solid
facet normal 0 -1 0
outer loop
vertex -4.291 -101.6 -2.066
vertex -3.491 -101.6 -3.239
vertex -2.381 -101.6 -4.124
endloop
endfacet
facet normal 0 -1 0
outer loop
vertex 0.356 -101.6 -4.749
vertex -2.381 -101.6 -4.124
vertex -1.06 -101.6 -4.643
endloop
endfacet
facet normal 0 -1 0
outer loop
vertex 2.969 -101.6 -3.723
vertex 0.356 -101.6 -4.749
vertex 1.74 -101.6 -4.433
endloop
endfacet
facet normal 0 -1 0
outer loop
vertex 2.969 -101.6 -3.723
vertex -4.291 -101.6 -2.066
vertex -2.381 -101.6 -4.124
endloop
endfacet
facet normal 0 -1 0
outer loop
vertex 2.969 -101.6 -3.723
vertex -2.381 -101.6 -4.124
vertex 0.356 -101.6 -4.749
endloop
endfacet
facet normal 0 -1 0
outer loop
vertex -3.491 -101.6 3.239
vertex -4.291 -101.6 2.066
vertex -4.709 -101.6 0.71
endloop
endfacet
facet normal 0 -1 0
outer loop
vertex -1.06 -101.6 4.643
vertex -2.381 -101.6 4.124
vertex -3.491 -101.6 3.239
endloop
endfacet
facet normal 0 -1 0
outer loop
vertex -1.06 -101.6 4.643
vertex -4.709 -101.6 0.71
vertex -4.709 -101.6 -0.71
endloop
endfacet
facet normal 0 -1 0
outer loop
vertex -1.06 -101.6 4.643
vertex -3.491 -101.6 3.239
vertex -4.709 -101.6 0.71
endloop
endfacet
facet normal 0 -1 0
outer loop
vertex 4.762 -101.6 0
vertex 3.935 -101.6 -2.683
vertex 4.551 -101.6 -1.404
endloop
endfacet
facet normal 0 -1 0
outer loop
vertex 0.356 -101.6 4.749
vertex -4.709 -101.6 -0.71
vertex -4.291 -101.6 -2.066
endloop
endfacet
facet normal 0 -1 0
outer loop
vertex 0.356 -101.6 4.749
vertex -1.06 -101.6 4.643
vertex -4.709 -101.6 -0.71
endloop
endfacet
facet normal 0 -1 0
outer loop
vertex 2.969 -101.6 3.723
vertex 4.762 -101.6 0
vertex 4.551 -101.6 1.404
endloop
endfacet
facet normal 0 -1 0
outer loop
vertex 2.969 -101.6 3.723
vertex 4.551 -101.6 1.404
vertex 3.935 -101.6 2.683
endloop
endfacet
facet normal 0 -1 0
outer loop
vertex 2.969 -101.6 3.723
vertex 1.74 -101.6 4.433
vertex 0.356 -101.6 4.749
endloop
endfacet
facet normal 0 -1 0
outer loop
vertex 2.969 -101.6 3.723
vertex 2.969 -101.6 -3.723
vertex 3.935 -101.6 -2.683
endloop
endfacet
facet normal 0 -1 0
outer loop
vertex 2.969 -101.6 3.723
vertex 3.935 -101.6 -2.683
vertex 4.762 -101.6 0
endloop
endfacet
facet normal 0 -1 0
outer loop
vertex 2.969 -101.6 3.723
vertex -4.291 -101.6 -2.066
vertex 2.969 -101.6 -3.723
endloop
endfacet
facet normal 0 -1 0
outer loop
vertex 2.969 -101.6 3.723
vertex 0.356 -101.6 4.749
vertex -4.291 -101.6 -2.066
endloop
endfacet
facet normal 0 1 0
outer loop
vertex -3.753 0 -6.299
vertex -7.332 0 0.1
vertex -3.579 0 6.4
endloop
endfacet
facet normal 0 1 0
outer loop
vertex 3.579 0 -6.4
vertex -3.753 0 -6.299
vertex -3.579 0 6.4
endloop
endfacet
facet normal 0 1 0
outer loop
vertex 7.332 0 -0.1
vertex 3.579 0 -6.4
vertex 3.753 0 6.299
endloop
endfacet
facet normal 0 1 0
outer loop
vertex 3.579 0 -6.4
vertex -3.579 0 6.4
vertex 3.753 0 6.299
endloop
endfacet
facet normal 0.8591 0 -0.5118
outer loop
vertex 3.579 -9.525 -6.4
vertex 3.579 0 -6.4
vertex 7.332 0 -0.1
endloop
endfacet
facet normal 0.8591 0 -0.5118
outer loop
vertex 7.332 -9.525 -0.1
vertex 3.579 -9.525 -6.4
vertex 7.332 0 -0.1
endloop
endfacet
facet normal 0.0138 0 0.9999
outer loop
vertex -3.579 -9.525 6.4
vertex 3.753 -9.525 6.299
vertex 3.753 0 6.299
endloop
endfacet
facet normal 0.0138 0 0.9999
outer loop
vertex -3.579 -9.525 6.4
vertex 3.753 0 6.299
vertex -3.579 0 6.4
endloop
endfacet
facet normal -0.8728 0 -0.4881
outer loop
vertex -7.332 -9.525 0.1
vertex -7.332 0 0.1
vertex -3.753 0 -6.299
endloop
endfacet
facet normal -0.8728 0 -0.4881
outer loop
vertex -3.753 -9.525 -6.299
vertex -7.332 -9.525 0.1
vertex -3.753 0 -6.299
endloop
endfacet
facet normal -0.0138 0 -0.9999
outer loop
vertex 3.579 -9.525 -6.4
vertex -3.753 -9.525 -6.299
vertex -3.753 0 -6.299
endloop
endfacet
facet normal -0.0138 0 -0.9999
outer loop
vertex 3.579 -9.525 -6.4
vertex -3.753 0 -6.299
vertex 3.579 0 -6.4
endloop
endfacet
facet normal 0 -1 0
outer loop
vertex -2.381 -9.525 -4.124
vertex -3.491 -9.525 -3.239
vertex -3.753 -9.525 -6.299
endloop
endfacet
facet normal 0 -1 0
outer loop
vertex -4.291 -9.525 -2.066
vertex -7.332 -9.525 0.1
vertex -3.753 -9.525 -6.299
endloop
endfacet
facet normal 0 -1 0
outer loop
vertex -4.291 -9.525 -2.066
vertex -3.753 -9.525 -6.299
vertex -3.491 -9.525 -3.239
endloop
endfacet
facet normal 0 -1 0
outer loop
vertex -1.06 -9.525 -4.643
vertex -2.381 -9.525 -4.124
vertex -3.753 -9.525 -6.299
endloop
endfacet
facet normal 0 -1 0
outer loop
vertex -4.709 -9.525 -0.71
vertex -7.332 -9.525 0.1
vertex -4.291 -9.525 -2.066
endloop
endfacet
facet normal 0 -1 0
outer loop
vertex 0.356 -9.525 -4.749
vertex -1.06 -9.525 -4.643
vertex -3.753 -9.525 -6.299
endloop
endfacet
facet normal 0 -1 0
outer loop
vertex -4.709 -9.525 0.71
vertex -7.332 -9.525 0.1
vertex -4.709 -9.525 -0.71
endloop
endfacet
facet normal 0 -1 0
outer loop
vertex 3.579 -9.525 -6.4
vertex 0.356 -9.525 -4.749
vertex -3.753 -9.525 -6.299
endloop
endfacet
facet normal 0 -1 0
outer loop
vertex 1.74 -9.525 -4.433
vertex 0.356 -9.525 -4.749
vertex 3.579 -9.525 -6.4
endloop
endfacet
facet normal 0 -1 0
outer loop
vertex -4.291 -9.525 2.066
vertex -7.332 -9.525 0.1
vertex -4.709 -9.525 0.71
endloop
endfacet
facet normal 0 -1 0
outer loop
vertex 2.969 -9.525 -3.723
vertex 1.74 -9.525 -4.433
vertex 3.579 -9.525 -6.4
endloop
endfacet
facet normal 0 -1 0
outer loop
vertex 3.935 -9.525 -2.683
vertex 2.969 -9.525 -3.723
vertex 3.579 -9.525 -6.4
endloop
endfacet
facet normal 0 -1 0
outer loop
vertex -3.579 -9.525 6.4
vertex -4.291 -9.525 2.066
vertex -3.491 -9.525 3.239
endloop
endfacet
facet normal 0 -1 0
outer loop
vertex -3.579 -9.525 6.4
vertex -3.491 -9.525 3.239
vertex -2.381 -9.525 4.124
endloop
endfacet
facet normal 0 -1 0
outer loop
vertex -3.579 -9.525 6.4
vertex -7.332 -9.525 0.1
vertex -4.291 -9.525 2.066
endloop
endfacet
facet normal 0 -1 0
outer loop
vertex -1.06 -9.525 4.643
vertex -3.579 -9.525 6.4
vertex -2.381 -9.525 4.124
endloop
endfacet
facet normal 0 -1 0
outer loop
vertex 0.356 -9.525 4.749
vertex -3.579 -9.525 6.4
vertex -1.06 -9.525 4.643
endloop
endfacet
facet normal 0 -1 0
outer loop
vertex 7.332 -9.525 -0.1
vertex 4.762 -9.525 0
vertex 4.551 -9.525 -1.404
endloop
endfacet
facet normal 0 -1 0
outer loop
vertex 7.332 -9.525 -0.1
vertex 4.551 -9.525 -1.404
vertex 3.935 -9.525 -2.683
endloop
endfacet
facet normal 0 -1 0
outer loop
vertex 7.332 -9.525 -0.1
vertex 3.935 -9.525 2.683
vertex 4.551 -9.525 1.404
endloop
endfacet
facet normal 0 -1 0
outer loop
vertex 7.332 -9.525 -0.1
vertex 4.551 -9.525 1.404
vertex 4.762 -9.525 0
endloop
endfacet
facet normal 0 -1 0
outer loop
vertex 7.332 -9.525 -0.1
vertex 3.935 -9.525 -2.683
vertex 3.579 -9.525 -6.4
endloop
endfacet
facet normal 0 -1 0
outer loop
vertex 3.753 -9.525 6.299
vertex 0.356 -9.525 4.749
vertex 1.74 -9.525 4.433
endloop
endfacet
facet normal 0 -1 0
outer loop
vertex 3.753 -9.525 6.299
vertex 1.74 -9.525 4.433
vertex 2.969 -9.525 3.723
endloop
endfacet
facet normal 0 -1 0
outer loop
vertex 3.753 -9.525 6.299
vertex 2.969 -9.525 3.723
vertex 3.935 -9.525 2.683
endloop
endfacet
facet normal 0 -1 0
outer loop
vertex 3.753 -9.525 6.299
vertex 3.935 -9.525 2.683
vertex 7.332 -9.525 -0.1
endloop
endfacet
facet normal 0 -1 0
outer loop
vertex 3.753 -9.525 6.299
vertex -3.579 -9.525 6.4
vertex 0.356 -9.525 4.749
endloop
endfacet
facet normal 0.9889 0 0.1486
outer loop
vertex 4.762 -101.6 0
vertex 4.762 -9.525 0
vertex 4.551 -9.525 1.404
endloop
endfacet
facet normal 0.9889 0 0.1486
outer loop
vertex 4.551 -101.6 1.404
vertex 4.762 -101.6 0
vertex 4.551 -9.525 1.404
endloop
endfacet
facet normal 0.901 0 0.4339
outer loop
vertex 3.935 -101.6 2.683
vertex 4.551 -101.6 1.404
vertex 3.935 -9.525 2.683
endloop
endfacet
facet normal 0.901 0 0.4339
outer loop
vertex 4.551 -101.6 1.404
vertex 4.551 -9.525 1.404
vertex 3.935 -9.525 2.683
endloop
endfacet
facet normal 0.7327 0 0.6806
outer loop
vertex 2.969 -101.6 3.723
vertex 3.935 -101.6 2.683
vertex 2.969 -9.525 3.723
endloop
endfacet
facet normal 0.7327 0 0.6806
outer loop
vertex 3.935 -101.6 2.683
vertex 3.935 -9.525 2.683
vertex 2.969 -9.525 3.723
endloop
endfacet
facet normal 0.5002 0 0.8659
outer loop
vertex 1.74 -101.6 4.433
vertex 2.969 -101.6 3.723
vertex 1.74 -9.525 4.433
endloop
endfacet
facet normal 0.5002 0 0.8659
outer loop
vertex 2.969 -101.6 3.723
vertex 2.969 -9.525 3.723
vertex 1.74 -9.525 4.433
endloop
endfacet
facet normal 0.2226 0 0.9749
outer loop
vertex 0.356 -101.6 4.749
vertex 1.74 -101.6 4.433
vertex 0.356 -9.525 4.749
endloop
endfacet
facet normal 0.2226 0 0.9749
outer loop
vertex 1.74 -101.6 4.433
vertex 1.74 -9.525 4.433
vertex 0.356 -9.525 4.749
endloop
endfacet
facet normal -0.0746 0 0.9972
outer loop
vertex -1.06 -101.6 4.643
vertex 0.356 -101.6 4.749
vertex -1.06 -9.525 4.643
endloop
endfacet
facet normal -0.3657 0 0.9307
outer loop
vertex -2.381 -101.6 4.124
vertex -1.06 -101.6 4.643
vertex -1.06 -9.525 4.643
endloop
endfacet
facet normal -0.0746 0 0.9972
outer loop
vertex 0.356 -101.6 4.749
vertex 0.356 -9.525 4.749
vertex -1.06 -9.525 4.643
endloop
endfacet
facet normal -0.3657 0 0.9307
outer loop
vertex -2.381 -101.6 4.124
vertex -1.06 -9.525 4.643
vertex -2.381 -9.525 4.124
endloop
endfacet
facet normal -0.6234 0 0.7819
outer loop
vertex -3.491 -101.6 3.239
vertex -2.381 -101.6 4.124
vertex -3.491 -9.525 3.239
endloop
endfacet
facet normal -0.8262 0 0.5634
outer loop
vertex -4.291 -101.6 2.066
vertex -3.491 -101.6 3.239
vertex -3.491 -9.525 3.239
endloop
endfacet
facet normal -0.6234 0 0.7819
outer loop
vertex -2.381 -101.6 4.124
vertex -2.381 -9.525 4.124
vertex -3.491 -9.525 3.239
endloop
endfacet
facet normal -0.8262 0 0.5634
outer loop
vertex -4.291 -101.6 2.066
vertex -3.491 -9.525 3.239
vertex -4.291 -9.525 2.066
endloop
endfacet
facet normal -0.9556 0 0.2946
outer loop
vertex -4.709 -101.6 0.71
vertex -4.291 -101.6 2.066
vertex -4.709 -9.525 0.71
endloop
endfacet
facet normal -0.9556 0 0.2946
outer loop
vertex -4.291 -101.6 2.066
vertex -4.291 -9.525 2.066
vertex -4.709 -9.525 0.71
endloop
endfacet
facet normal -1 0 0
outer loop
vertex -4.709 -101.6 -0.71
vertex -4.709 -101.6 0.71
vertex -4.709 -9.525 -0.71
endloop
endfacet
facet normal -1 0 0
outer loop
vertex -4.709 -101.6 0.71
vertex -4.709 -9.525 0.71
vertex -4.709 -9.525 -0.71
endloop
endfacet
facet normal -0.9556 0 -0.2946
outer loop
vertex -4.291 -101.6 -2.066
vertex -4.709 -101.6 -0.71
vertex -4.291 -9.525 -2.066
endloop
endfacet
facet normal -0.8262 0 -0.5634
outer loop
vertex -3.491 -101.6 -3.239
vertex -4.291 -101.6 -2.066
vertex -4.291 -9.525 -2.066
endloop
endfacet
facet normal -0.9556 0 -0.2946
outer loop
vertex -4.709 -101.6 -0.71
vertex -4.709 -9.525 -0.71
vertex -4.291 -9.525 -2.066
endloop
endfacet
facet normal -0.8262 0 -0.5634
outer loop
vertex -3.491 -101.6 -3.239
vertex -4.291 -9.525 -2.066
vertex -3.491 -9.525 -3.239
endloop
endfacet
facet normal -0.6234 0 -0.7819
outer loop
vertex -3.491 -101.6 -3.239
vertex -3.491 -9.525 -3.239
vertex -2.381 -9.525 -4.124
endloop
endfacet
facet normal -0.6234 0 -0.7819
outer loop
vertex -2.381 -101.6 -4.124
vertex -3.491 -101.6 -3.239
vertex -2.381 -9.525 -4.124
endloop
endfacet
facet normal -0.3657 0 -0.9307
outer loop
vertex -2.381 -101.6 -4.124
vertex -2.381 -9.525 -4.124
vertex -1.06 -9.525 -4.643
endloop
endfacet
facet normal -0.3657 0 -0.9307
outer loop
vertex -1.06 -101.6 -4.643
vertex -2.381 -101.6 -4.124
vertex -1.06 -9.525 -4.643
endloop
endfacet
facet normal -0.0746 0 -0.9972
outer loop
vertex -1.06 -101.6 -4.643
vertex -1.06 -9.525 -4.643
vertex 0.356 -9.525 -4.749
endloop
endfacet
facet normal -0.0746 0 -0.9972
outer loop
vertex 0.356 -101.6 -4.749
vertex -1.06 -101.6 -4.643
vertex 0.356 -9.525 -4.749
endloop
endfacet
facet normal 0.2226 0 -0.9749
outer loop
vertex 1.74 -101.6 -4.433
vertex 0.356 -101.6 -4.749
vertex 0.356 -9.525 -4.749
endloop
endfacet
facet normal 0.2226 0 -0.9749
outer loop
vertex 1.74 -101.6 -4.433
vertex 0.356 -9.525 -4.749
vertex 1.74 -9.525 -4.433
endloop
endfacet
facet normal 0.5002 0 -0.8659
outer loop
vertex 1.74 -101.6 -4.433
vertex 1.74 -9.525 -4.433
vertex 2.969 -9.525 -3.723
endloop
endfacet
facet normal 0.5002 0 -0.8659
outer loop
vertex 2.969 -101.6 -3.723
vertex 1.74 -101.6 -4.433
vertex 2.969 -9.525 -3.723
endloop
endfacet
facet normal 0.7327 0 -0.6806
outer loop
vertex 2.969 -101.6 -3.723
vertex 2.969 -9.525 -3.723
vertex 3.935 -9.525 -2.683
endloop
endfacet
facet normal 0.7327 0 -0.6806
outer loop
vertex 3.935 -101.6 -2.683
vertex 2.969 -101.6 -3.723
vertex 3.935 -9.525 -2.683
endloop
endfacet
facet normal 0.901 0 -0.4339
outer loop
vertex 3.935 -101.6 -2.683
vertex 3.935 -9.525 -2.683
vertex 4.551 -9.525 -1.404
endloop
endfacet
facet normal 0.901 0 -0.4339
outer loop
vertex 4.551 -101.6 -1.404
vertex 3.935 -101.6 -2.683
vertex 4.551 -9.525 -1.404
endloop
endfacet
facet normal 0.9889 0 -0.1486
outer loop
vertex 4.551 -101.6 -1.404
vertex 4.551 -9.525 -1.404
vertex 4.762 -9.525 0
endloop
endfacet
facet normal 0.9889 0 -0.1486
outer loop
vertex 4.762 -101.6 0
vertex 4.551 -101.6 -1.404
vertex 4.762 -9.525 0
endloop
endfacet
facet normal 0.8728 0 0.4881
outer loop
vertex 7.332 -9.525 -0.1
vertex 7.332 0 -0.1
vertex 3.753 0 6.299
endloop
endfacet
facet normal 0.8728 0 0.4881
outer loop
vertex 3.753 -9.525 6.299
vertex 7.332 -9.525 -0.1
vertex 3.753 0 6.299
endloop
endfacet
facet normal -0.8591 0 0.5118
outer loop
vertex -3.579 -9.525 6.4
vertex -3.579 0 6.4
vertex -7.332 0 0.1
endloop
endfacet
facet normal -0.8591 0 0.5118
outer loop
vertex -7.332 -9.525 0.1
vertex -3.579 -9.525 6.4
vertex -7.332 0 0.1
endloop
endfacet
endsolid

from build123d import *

# Parameters (mm, degrees)
F0_R     = 4.7625
F2_DEPTH = 101.6
F4_DEPTH = 9.525


with BuildPart() as f2:
    # F0 (on Front) → F2 (new body)
    with BuildSketch(Plane.XZ):
        Circle(F0_R)
    extrude(amount=F2_DEPTH)

    # F3 (on Front) → F4 (join)
    with BuildSketch(Plane.XZ):
        Polygon((7.331661, -0.100432), (3.752807, 6.299188), (-3.578853, 6.39962), (-7.331661, 0.100432), (-3.752807, -6.299188), (3.578853, -6.39962), align=None)
    extrude(amount=F4_DEPTH)


solid = f2.part
